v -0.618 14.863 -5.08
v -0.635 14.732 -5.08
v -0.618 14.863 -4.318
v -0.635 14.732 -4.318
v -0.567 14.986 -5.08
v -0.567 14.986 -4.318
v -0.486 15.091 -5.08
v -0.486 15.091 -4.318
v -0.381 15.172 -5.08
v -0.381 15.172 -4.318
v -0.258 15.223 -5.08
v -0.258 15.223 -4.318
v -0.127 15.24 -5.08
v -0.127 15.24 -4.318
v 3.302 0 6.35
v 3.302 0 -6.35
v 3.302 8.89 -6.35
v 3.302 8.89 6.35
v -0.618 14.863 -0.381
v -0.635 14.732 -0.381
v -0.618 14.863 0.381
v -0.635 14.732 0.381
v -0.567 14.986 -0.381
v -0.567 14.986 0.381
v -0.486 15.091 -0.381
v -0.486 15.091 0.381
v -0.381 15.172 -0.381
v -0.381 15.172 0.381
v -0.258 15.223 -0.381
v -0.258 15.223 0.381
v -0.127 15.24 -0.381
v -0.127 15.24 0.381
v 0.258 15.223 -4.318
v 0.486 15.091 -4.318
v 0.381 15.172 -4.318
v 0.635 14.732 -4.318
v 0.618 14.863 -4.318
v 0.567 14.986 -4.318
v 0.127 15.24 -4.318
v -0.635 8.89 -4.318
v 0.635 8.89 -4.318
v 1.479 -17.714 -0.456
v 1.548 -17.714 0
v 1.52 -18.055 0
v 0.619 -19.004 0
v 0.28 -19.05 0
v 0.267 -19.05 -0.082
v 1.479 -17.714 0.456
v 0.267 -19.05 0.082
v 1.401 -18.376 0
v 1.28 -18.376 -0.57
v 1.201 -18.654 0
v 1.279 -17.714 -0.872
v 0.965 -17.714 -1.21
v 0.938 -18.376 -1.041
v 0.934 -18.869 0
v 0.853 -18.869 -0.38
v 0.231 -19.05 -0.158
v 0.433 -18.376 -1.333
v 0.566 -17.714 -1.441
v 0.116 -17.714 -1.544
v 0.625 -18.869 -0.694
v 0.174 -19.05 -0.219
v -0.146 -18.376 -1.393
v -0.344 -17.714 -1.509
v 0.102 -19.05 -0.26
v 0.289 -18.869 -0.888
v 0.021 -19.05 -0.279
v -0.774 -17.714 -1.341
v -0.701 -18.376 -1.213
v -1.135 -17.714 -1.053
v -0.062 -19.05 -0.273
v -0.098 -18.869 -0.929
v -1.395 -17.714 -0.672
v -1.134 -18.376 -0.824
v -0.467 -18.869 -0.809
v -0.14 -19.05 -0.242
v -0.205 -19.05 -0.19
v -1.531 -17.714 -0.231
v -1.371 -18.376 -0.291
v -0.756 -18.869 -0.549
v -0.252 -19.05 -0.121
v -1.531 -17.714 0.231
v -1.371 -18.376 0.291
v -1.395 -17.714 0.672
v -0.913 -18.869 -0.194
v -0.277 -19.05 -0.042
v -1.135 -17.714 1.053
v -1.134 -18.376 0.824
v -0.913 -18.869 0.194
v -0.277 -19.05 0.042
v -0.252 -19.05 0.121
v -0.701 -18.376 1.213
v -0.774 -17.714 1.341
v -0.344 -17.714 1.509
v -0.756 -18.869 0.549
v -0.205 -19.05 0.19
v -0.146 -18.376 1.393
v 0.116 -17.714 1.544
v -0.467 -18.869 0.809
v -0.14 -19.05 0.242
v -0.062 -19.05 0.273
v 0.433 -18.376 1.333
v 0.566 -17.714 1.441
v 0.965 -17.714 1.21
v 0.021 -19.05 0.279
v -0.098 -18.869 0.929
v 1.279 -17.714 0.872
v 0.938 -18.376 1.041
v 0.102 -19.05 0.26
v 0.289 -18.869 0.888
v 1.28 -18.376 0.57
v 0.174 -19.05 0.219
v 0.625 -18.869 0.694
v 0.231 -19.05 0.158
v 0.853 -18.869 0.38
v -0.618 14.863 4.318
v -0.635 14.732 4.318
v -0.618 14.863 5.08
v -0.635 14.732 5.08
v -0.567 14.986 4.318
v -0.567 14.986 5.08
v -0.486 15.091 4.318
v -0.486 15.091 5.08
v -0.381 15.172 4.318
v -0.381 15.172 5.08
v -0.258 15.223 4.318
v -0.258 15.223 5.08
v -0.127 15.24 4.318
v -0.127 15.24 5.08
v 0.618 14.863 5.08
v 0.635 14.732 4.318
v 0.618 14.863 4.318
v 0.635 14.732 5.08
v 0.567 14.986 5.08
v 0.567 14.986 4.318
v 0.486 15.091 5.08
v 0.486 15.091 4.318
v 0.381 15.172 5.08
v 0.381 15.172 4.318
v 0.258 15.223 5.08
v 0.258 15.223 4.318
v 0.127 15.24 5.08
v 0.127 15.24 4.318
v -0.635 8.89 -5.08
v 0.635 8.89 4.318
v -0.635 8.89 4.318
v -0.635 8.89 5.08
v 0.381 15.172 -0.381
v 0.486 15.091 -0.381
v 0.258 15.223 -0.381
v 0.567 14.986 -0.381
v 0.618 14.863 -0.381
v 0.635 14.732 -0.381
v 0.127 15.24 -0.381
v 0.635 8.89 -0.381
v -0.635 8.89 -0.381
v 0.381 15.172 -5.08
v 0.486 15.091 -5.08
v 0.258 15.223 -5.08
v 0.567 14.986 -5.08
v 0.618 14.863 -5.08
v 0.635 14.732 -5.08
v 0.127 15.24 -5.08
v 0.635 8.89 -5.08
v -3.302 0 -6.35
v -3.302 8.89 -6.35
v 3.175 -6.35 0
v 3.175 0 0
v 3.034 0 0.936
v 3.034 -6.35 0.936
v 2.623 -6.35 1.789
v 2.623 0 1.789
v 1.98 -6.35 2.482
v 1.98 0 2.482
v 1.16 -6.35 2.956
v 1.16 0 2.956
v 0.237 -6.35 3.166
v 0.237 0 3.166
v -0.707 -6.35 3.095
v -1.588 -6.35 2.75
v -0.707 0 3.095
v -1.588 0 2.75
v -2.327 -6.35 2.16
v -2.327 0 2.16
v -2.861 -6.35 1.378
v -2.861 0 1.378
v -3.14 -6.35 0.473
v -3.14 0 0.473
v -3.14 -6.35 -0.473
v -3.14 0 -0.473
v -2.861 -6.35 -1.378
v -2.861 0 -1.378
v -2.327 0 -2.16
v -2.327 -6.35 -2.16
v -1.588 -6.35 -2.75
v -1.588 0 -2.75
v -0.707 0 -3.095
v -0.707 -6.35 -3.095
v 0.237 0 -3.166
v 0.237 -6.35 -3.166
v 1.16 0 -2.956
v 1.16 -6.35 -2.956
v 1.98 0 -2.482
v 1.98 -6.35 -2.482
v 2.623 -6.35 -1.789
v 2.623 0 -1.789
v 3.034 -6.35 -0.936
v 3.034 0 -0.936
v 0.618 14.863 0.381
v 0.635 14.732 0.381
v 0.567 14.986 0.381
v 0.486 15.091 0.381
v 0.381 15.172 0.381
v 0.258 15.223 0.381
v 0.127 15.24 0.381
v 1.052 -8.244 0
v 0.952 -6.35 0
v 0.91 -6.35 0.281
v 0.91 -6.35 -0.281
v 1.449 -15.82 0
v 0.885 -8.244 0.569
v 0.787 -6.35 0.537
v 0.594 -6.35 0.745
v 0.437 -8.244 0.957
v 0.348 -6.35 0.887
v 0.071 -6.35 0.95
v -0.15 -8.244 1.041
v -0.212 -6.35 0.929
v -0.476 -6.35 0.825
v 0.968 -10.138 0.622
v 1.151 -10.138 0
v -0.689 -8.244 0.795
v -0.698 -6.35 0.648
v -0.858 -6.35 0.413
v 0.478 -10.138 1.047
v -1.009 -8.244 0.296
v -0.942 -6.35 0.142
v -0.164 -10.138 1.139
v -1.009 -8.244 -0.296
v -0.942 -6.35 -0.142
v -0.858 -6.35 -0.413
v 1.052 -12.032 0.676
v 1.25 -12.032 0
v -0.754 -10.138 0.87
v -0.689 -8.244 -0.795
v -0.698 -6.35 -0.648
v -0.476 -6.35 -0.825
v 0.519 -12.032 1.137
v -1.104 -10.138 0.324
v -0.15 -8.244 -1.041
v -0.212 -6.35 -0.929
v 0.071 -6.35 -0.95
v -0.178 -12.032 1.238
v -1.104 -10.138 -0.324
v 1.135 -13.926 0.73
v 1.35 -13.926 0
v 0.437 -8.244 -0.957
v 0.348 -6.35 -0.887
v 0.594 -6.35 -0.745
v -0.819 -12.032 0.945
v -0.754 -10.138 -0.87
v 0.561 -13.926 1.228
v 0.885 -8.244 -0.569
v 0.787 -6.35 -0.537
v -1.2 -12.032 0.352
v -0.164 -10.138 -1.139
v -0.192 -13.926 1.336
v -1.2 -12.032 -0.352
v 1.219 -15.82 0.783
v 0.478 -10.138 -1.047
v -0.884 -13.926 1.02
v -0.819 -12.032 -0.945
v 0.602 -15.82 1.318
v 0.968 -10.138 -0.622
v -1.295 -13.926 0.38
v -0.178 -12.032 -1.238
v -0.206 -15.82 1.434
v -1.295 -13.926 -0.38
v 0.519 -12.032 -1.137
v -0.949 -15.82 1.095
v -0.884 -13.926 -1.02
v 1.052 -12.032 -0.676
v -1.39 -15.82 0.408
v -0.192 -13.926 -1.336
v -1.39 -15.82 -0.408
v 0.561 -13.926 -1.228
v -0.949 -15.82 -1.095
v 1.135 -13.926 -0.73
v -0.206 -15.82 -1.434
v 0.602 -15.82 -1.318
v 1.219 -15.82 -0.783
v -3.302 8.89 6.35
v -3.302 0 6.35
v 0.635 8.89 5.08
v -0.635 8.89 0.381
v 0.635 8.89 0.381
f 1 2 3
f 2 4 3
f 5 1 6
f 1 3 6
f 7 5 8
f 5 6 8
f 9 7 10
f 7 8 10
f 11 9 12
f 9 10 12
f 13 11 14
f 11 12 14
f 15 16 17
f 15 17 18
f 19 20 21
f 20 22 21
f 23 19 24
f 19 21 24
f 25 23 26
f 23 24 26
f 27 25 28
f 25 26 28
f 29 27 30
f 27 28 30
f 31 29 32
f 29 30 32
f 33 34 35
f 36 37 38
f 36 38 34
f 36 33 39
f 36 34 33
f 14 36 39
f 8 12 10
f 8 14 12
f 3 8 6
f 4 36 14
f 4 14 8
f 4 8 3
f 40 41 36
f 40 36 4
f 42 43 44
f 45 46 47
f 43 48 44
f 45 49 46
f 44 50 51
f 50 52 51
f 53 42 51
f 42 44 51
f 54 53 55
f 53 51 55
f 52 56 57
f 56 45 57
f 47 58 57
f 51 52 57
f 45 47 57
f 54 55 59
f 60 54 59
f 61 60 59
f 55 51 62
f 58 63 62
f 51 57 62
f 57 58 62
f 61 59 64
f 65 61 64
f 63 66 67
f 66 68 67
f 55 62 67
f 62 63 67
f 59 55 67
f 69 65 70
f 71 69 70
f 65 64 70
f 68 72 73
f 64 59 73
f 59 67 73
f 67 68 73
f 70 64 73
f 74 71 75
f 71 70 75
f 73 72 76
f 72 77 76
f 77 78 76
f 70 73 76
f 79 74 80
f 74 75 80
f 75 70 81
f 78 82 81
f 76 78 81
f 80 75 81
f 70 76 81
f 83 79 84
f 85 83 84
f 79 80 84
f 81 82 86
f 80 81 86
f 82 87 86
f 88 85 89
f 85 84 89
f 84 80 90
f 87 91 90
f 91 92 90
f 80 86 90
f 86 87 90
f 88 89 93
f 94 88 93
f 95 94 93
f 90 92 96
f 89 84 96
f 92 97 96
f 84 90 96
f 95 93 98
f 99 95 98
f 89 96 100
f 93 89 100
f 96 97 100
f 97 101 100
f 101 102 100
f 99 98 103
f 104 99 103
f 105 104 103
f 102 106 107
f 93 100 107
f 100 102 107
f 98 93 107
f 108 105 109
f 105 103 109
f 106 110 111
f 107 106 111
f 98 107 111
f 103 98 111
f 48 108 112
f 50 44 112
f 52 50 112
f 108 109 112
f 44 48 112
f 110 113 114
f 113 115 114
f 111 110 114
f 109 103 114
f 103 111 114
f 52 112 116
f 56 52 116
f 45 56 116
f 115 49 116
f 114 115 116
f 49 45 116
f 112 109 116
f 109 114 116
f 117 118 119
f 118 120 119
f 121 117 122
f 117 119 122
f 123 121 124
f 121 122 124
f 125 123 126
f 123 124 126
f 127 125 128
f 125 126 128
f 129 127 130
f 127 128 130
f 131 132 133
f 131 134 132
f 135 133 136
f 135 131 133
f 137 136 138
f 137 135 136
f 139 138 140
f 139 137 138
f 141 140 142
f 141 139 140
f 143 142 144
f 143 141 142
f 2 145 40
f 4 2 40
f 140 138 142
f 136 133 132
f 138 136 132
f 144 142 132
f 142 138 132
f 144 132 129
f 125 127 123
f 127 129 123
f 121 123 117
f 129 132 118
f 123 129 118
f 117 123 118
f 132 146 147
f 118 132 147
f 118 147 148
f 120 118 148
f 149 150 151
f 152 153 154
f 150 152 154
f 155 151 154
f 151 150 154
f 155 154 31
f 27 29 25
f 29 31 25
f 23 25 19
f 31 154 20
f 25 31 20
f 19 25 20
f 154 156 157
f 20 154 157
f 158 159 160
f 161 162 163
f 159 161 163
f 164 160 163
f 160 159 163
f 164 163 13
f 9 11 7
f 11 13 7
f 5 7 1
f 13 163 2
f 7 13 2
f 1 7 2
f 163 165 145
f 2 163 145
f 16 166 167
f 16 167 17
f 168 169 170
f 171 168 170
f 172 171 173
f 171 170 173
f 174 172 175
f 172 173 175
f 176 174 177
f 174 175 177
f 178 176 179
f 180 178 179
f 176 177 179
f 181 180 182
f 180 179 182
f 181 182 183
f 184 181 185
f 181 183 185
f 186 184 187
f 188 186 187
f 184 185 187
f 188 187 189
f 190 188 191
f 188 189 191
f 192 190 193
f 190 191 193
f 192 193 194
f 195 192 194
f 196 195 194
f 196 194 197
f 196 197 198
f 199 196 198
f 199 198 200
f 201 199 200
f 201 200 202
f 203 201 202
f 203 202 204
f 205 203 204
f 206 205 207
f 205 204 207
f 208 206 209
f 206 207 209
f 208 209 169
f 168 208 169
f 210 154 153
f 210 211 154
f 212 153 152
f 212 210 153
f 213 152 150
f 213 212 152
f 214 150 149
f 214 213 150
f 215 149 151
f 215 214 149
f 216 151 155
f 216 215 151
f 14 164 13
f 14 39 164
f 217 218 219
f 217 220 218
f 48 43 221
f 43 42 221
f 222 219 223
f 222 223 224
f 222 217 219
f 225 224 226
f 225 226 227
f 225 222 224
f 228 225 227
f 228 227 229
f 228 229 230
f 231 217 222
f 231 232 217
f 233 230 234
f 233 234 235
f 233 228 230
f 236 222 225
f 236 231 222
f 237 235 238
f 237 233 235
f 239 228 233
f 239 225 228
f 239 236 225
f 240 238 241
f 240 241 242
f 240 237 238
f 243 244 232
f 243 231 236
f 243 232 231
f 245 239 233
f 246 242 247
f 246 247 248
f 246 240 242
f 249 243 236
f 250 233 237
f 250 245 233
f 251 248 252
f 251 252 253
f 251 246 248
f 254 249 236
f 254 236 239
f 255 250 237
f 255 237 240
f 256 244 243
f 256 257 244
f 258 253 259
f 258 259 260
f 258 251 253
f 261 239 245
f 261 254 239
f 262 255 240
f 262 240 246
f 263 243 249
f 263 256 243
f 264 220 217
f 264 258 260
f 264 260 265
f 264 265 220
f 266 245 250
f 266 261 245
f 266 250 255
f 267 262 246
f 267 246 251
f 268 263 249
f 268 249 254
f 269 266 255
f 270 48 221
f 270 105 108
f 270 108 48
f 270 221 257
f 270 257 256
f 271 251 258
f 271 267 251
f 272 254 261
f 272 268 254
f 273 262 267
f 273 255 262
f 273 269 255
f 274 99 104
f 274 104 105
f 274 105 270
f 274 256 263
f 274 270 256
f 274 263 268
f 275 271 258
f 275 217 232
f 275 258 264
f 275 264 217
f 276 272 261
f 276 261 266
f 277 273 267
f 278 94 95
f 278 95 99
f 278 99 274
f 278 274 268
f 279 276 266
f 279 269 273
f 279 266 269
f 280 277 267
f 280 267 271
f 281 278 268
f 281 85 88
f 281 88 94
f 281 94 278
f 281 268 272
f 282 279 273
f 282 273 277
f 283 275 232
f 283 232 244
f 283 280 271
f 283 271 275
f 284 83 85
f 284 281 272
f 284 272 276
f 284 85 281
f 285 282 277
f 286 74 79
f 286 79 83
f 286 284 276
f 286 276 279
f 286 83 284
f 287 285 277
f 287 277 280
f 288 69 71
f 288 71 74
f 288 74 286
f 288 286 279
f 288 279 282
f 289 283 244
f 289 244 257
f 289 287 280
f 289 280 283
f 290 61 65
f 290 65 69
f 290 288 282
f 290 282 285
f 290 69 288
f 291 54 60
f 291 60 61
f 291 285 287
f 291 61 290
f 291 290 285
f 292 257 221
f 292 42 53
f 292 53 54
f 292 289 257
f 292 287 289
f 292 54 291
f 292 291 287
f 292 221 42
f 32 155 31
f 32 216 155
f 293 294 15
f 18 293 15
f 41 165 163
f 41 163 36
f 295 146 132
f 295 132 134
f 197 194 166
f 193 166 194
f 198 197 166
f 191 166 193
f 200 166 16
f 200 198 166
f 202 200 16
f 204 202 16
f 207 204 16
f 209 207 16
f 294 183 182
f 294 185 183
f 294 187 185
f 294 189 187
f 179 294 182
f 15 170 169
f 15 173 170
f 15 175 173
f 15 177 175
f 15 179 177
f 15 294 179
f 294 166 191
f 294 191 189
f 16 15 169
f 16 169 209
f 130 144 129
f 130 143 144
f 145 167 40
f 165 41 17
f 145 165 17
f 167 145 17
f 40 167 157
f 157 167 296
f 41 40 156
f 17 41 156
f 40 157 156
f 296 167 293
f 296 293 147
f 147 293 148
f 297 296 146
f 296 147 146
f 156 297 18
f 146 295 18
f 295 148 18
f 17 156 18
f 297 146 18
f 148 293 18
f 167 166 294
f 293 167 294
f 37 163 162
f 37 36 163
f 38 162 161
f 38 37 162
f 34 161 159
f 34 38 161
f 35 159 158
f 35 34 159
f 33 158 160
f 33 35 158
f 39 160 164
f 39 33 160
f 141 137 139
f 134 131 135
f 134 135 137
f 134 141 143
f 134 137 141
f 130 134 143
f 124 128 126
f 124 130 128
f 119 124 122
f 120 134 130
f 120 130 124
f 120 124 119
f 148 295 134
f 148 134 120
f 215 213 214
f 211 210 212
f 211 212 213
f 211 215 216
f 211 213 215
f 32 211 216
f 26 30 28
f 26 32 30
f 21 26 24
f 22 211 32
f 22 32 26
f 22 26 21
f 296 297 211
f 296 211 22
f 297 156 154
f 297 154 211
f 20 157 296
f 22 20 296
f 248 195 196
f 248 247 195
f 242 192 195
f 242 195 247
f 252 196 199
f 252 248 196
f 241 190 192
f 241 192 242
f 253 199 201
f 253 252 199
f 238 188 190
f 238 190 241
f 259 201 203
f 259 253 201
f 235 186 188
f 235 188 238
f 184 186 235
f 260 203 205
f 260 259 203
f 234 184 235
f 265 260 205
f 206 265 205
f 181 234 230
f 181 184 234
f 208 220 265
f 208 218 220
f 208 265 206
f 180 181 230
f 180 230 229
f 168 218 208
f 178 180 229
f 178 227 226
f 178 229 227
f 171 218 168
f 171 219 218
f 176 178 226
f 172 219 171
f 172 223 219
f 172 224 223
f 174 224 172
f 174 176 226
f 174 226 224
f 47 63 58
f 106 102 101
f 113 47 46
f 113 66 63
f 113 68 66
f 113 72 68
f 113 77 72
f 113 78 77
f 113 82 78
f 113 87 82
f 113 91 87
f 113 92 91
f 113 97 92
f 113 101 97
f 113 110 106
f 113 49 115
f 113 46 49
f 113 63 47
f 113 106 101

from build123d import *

# Parameters (mm, degrees)
F0_W     = 6.604
F0_H     = 12.7
F0_R     = 3.175
F1_DEPTH = 8.89
F2_DEPTH = 6.35
F3_R     = 0.9525
F4_DEPTH = 12.7
F4_TAPER = -3
F5_R     = 1.27
F6_W     = 1.27
F6_H     = 0.762
F7_DEPTH = 6.35
F8_R     = 0.508


with BuildPart() as f1:
    # F0 (on Front) → F1 (new body)
    with BuildSketch(Plane.XZ):
        Rectangle(F0_W, F0_H)
        Circle(F0_R, mode=Mode.SUBTRACT)
        Circle(F0_R)
    extrude(amount=-F1_DEPTH)

    # F0 (on Front) → F2 (join)
    with BuildSketch(Plane.XZ):
        Circle(F0_R)
    extrude(amount=F2_DEPTH)

    # F3 (on face) → F4 (join)
    with BuildSketch(Plane.XZ.offset(6.35)):
        Circle(F3_R)
    extrude(amount=F4_DEPTH, taper=F4_TAPER)

    # F5
    f5_edges = [f1.edges().sort_by_distance(p)[0] for p in [
        (-1.618079, -19.05, 0),
    ]]
    fillet(f5_edges, radius=F5_R)

    # F6 (on face) → F7 (join)
    with BuildSketch(Plane(origin=(0, 8.89, 0), x_dir=(-1, 0, 0), z_dir=(0, 1, 0))):
        with Locations((0, 4.699)):
            Rectangle(F6_W, F6_H)
        Rectangle(F6_W, F6_H)
        with Locations((0, -4.699)):
            Rectangle(F6_W, F6_H)
    extrude(amount=F7_DEPTH)

    # F8
    f8_edges = [f1.edges().sort_by_distance(p)[0] for p in [
        (0.635, 15.24, 4.699),
        (-0.635, 15.24, 4.699),
        (0.635, 15.24, 0),
        (-0.635, 15.24, 0),
        (0.635, 15.24, -4.699),
        (-0.635, 15.24, -4.699),
    ]]
    fillet(f8_edges, radius=F8_R)


solid = f1.part
